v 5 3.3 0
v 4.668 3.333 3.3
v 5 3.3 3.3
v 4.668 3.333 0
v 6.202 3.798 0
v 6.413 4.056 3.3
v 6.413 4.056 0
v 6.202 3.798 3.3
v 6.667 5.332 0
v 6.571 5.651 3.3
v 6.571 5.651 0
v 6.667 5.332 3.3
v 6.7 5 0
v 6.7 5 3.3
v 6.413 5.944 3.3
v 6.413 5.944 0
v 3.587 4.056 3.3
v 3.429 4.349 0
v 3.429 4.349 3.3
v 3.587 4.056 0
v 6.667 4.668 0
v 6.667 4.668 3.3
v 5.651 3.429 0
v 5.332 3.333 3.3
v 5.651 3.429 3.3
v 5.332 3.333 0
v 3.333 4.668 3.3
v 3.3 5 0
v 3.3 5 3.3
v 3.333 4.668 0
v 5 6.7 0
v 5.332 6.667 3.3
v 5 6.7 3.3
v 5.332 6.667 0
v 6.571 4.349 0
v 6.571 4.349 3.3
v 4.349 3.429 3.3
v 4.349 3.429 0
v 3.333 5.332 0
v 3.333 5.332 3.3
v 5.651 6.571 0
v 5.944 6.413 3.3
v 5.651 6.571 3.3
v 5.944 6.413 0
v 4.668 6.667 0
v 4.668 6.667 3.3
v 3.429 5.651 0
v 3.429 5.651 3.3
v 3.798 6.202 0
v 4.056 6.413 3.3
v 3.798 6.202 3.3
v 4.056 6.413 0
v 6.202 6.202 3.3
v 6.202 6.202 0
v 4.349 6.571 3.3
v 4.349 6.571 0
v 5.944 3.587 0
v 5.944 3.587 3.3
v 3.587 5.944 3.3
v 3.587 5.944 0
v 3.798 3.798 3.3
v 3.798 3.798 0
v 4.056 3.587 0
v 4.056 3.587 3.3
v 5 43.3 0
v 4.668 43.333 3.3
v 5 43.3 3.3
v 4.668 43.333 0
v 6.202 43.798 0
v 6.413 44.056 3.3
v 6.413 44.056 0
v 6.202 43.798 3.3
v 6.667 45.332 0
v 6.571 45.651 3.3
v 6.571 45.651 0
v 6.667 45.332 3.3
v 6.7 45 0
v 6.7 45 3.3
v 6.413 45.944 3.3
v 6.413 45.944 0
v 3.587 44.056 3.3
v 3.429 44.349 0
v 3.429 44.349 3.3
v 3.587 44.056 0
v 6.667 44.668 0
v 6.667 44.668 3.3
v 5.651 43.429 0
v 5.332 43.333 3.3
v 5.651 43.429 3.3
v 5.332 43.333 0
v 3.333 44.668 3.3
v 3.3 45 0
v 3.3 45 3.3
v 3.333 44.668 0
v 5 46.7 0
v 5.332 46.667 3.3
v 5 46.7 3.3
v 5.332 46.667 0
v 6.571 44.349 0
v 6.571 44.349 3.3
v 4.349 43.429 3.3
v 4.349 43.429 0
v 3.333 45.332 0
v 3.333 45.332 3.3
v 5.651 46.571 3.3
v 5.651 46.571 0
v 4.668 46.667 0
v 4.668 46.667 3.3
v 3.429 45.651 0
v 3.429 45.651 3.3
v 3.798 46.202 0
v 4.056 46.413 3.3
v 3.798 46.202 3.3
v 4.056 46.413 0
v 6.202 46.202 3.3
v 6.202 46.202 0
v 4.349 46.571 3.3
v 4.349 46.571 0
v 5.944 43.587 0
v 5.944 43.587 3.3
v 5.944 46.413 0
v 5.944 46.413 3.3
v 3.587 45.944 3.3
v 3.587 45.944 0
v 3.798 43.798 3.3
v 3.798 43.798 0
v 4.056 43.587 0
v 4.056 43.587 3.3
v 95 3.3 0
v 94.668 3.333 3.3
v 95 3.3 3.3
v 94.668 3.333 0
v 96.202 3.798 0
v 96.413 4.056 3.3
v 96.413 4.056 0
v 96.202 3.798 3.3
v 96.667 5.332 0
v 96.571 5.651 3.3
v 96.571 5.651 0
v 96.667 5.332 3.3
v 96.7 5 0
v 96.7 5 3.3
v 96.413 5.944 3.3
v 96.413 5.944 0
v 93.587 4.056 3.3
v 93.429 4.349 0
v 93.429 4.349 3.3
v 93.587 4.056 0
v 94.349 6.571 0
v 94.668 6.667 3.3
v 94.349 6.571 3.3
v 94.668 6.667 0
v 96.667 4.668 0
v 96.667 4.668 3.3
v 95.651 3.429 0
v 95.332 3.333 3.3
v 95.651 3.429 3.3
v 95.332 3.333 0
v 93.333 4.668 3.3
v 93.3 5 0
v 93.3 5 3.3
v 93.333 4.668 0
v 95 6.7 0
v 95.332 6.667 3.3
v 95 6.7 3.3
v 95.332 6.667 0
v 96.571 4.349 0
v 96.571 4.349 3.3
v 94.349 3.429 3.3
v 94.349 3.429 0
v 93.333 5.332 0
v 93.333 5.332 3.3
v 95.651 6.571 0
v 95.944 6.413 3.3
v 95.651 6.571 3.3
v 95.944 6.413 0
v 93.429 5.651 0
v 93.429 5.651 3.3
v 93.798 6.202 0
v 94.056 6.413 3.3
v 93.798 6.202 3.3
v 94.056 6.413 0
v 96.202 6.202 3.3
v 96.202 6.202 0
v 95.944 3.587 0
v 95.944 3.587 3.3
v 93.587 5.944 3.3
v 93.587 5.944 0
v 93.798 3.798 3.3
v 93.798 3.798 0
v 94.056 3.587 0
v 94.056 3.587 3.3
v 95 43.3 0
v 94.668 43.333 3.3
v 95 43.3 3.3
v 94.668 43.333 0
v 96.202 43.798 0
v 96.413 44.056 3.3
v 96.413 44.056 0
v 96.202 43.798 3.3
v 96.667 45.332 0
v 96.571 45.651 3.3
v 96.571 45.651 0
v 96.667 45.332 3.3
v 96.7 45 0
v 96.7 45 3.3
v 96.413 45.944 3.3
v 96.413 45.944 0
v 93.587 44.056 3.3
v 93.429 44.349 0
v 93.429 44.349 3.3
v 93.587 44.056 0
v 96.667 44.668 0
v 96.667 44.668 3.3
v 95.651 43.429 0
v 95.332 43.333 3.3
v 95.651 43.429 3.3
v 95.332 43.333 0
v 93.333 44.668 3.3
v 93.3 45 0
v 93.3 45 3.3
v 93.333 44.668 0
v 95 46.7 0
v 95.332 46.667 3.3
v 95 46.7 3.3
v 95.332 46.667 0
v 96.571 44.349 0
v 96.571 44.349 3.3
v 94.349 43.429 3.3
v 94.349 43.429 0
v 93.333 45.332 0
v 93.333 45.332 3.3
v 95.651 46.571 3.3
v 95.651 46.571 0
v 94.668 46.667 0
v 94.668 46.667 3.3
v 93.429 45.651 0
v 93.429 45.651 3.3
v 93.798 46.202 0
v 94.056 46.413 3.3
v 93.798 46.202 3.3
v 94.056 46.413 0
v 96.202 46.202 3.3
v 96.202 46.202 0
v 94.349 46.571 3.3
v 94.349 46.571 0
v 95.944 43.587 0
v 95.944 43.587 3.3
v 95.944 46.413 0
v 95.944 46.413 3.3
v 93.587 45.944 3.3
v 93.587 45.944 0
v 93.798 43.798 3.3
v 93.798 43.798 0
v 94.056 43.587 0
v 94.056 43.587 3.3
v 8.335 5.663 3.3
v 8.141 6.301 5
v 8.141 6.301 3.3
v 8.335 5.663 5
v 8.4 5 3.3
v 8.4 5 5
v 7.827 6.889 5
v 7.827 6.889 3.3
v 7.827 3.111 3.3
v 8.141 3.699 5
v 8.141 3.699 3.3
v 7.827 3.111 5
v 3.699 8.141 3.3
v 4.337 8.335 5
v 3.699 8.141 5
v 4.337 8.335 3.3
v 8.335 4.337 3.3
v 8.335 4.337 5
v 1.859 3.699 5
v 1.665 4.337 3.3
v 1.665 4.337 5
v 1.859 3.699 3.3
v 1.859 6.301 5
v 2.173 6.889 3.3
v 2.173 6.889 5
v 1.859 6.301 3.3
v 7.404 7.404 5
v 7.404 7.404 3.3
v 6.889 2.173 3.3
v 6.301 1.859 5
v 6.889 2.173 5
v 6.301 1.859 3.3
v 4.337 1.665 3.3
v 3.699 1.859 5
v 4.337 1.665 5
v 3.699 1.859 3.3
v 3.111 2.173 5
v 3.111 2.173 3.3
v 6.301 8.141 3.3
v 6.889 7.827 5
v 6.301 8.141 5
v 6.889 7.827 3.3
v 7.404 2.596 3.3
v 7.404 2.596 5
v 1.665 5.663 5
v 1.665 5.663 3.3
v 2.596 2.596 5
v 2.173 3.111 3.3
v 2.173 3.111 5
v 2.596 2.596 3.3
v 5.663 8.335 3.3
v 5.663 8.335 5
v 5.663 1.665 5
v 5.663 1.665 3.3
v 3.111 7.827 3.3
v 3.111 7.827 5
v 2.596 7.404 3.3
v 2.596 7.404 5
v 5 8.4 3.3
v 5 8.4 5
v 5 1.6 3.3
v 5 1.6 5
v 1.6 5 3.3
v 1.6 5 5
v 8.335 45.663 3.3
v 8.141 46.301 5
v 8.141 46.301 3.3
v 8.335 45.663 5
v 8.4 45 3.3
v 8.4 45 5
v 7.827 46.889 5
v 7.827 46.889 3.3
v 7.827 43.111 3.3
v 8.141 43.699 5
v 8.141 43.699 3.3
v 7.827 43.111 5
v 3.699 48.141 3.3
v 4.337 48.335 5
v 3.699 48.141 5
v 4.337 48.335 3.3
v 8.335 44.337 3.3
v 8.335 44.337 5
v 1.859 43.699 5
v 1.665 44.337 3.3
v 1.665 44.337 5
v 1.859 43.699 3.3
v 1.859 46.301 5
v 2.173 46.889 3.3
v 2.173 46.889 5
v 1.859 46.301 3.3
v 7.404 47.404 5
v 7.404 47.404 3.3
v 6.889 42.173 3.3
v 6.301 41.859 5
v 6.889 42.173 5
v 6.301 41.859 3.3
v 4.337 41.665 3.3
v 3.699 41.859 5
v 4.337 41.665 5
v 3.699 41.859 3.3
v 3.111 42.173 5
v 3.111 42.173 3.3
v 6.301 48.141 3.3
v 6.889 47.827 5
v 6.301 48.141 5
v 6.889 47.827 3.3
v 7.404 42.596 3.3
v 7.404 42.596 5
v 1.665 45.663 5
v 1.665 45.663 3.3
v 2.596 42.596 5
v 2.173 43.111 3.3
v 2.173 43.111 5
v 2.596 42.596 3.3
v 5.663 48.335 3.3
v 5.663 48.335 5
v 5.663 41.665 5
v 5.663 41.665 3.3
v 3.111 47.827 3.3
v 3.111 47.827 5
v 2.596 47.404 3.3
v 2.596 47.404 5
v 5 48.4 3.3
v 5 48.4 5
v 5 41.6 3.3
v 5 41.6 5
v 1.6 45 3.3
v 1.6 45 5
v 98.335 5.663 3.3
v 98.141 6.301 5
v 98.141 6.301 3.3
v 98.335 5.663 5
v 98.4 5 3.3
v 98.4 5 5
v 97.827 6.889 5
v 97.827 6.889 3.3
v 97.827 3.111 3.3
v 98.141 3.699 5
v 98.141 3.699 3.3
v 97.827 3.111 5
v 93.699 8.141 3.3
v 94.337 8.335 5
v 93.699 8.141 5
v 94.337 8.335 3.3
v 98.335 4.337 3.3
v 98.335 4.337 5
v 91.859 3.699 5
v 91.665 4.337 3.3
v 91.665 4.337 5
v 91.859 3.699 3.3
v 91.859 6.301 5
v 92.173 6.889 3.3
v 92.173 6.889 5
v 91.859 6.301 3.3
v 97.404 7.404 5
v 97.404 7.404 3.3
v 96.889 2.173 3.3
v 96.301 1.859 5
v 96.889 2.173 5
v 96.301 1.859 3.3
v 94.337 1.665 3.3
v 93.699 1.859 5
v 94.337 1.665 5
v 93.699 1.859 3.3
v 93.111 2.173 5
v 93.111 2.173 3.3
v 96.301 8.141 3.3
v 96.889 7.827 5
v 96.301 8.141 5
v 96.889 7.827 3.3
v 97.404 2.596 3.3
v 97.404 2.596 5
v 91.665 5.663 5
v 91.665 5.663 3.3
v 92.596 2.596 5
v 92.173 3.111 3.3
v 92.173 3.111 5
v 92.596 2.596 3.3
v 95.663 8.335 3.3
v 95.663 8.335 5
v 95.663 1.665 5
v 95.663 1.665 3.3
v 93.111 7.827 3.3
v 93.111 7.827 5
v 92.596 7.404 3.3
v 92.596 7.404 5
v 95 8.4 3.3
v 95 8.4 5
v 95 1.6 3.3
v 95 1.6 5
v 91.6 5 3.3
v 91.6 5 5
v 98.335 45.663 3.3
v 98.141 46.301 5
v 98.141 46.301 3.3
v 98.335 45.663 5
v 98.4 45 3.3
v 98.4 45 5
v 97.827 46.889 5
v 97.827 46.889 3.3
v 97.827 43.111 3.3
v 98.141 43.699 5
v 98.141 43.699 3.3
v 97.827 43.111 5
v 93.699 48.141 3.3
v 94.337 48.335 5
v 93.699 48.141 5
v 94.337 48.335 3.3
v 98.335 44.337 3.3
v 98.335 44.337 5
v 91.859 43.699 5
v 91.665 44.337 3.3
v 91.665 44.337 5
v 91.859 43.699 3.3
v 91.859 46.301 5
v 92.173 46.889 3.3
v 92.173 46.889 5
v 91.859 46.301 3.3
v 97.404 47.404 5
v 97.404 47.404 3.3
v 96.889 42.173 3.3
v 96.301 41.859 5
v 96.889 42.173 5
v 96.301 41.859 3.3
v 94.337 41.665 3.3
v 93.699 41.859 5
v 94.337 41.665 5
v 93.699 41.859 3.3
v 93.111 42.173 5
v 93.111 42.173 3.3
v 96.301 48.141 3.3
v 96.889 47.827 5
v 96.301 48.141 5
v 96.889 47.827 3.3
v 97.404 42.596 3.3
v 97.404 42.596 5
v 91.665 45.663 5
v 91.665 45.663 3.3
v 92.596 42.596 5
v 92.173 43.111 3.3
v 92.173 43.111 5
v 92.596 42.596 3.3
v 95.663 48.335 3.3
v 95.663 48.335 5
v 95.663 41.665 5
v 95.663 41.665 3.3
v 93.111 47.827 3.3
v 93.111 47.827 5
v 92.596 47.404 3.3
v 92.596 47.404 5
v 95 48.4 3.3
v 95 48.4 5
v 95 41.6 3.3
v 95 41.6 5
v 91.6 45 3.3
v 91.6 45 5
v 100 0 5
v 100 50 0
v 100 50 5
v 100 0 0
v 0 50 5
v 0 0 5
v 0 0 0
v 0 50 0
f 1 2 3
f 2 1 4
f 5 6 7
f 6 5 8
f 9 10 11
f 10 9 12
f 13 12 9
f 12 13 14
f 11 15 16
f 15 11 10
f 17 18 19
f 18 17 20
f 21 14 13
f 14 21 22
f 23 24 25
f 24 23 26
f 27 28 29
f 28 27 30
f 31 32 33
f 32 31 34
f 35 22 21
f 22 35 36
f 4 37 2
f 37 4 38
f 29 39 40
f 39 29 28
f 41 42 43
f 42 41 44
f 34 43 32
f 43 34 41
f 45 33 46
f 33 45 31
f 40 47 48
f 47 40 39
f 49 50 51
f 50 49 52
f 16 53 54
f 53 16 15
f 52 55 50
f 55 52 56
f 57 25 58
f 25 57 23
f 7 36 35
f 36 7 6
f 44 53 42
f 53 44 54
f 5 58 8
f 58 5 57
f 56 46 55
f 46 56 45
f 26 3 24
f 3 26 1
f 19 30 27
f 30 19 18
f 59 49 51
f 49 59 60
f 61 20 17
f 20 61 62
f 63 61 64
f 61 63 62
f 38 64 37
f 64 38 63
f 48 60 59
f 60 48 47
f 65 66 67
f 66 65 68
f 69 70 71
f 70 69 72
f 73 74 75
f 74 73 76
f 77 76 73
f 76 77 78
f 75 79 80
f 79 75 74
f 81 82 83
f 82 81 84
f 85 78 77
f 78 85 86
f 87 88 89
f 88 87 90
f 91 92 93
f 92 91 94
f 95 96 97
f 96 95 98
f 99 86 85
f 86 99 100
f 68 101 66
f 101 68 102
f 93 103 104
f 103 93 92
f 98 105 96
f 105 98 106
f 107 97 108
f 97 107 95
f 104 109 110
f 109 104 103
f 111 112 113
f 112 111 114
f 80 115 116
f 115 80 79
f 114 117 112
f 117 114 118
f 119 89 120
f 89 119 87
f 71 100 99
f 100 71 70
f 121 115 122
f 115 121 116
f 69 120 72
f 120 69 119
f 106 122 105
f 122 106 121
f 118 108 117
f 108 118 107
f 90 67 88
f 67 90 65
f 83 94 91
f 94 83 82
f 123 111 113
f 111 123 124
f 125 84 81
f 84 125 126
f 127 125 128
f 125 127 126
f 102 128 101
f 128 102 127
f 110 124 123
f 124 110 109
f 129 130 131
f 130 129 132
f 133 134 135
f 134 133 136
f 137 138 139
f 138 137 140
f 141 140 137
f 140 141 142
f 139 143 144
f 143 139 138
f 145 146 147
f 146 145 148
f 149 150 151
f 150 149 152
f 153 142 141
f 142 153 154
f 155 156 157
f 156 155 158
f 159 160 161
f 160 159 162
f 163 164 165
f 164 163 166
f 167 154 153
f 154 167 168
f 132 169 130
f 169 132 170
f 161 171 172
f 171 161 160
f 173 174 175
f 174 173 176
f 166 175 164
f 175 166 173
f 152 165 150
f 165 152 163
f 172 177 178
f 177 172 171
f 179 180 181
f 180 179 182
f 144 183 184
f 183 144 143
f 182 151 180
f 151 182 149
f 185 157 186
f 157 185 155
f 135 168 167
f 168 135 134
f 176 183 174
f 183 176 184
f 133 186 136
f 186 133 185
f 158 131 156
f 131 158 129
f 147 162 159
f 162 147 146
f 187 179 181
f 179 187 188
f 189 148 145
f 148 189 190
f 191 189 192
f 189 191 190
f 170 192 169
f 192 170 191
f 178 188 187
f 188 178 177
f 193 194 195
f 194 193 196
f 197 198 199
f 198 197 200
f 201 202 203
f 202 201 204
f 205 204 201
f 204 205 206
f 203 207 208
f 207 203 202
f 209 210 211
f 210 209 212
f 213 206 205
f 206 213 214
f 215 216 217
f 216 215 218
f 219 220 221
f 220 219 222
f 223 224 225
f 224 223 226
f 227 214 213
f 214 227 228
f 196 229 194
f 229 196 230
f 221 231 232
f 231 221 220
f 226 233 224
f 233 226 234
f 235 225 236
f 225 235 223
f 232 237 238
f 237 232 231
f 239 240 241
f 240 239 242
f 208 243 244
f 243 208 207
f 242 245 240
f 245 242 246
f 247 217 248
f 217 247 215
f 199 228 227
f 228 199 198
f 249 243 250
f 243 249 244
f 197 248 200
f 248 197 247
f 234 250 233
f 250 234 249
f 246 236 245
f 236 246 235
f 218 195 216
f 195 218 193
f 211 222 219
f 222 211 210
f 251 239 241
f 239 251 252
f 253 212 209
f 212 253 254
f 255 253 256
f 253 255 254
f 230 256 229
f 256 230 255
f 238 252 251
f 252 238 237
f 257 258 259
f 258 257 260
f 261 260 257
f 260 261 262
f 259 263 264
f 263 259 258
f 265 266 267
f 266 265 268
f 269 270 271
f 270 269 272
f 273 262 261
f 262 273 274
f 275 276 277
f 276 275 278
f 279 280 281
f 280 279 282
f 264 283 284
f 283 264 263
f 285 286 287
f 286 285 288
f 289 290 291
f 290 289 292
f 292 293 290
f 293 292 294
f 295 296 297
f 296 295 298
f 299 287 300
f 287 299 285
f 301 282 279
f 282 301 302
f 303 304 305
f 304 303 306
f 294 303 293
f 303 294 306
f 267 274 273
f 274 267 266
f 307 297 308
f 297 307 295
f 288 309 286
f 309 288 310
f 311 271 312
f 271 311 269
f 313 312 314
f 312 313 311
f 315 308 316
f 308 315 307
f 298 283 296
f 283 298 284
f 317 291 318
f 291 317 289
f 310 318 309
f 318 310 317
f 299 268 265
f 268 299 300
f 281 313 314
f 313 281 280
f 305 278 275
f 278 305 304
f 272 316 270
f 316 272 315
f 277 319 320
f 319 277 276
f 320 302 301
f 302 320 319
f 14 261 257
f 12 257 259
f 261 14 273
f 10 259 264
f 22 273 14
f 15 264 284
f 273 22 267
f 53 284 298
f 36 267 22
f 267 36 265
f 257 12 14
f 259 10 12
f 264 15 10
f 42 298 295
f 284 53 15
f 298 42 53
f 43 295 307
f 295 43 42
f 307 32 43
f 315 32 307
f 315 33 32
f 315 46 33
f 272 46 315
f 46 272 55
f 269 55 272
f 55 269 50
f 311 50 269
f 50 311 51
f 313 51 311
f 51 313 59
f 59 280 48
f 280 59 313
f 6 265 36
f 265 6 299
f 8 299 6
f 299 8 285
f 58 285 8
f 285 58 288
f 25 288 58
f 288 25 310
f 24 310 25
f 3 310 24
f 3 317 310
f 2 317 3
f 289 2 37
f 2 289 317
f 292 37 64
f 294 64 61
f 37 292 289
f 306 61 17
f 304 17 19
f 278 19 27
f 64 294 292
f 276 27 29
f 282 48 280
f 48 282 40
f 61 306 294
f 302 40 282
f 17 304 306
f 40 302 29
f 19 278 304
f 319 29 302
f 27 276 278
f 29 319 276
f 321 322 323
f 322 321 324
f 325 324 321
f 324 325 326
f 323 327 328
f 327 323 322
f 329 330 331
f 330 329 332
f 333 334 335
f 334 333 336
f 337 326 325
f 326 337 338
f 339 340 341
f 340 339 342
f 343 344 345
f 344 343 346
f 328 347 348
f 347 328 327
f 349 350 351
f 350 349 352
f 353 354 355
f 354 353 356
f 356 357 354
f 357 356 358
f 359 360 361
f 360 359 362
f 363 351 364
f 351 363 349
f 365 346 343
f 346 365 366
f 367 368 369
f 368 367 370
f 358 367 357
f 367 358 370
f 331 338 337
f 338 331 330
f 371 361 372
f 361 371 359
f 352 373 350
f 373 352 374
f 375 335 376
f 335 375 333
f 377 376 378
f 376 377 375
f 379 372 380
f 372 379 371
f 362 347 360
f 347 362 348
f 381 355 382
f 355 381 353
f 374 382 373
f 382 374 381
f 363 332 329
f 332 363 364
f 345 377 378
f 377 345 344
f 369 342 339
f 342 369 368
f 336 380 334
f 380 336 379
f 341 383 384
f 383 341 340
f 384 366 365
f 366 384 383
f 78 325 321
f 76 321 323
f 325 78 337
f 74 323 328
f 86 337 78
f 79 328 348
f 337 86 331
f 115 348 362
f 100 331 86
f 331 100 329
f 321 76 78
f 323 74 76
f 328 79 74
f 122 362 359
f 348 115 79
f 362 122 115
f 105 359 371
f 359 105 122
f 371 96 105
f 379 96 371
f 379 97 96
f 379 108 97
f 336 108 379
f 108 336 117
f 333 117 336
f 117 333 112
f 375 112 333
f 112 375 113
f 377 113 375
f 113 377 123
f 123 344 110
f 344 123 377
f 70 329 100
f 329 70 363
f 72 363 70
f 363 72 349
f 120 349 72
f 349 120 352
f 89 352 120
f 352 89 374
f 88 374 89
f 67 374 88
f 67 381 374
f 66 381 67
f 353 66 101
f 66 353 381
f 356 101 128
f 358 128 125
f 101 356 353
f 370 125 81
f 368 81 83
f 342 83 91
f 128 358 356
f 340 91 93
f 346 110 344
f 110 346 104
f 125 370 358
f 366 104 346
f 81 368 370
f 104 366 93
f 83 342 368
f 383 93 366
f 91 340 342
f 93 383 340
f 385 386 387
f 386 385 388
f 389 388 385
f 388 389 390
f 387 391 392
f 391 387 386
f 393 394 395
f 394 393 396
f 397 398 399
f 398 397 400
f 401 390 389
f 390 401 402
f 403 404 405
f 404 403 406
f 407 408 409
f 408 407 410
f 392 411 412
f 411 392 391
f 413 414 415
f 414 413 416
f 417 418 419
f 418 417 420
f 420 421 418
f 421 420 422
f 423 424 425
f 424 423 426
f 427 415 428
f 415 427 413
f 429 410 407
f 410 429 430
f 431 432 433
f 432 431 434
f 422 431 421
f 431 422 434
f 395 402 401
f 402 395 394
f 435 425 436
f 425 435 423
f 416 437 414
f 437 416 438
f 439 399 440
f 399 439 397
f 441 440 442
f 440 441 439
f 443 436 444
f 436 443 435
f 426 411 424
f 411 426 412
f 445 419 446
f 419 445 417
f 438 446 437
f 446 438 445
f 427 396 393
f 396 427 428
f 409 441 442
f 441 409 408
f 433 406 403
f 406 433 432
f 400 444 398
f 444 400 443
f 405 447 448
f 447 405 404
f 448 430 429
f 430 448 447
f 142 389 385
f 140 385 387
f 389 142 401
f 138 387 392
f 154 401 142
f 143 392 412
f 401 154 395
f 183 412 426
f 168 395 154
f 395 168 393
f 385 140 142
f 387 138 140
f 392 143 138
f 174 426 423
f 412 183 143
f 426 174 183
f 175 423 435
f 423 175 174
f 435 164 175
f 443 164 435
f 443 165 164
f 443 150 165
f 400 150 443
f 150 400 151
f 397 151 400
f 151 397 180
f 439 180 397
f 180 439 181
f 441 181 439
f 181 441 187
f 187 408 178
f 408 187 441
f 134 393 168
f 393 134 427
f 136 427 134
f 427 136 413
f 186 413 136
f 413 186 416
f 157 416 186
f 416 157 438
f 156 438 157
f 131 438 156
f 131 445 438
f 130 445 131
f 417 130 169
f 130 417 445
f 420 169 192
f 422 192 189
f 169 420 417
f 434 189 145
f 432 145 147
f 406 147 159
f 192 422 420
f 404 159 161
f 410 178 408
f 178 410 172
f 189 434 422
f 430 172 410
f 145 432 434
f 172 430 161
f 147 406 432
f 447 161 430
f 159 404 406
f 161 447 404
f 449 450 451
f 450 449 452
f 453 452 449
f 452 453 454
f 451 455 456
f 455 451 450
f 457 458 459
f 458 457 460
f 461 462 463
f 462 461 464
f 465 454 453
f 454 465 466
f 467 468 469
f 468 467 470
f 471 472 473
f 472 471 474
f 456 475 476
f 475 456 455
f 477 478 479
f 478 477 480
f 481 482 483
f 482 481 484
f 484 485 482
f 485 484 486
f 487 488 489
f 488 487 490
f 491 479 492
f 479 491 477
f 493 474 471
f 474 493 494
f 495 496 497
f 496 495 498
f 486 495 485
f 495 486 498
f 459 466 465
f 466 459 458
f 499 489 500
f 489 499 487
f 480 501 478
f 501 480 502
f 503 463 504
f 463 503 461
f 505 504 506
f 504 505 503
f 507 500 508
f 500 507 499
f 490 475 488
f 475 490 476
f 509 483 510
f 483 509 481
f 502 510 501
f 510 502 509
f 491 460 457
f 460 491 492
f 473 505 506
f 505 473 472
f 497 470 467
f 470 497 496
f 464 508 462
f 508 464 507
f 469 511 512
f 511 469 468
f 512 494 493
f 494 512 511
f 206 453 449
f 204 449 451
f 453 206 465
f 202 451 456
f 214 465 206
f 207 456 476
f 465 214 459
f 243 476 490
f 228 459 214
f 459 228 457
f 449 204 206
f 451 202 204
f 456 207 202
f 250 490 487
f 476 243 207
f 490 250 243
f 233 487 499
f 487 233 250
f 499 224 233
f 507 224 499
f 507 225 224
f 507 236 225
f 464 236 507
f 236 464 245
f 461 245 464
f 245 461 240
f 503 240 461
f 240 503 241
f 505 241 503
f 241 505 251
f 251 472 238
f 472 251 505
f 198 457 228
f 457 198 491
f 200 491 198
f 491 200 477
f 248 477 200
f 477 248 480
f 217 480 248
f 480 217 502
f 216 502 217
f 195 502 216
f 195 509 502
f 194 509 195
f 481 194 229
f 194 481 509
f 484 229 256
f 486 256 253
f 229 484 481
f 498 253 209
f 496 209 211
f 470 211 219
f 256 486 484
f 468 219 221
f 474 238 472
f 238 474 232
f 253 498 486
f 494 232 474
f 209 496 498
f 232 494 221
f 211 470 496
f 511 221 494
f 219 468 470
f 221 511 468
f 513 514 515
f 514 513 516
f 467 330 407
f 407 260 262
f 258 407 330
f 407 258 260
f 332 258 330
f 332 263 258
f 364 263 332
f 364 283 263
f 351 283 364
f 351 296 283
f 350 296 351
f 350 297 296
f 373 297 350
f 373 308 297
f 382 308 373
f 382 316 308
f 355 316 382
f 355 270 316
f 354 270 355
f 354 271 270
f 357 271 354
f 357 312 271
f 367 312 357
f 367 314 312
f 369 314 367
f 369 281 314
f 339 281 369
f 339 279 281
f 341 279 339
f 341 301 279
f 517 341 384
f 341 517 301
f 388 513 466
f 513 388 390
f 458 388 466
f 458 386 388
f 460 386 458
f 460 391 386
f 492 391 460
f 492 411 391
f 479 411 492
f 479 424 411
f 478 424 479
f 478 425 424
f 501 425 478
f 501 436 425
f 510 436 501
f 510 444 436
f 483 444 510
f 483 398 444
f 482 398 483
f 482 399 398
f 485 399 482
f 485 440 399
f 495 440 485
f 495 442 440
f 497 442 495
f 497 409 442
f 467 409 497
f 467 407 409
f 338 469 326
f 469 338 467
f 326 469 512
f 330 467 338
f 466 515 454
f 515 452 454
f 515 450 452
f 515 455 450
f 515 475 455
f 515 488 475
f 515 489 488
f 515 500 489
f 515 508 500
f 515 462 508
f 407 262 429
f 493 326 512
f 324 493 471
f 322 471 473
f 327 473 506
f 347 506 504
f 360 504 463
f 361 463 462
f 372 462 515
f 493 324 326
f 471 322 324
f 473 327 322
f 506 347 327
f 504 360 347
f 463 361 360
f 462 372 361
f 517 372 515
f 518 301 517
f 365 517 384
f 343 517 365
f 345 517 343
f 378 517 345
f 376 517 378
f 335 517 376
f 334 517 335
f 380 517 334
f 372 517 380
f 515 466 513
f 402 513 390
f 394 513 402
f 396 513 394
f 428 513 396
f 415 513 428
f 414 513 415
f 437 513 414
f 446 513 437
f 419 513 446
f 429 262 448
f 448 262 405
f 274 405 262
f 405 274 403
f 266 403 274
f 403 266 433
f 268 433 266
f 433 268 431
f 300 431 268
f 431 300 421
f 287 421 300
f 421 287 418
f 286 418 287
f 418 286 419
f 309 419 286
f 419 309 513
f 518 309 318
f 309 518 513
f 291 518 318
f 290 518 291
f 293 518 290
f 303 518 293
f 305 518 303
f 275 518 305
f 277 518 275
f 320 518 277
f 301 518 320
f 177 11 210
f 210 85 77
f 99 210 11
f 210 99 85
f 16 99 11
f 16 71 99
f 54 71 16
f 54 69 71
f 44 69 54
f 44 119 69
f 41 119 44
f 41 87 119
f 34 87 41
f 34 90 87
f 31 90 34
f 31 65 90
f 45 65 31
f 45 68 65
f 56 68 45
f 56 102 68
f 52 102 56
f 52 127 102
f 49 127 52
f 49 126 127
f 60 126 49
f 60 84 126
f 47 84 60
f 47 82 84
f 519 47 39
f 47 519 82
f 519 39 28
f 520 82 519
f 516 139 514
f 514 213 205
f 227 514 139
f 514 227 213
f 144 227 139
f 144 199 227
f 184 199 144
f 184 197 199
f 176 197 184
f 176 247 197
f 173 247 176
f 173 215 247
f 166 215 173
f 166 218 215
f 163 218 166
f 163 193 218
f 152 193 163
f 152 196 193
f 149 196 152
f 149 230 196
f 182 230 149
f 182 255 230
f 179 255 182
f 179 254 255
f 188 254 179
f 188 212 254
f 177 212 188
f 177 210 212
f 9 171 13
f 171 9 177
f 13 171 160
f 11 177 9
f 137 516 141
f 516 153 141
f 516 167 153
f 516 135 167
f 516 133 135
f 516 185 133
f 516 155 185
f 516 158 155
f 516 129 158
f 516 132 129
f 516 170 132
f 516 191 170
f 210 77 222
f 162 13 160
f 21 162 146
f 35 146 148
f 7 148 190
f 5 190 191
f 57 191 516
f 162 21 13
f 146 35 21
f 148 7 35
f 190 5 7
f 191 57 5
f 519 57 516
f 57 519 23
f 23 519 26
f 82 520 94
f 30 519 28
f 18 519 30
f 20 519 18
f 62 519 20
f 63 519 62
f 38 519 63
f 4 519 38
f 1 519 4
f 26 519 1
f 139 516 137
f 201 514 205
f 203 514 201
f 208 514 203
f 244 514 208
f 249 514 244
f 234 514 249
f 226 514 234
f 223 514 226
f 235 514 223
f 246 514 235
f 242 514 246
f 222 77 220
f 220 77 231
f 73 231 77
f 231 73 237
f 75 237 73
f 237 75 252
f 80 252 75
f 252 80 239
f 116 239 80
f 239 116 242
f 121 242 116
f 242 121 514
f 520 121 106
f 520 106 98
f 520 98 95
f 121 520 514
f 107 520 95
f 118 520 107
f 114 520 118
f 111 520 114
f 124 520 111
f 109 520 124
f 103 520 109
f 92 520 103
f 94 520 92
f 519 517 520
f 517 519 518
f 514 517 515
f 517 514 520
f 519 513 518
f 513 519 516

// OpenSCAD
$fn = 32;
// ----------------------------------------------------------------------
// Enclosure lid: 100 x 50 x 5 mm, 4 bolt holes
// ----------------------------------------------------------------------

// --- parameters (mm) ---
length = 100;             // lid length, X
width = 50;               // lid width, Y
plate_t = 5;              // lid plate thickness
bolt_d = 3.4;             // bolt clearance
boss_lip = 5;             // bolt hole inset from the corner
sink = 1;                 // overlap of the lip and ribs into the plate
cs_d = 6.8;               // countersink diameter
cs_h = 1.7;               // countersink depth

module plate() {
  cube([length, width, plate_t]);
}

difference() {
  plate();
  /* bolt pattern matching the corner bosses */
  for (sx = [0, 1]) for (sy = [0, 1])
    translate([sx * (length - 2 * boss_lip) + boss_lip, sy * (width - 2 * boss_lip) + boss_lip, -0 - 1])
      cylinder(h = plate_t + 0 + 2, d = bolt_d);
  /* countersinks so the heads sit flush */
  for (sx = [0, 1]) for (sy = [0, 1])
    translate([sx * (length - 2 * boss_lip) + boss_lip, sy * (width - 2 * boss_lip) + boss_lip, plate_t - cs_h])
      cylinder(h = cs_h + 0.5, d = cs_d);
}
